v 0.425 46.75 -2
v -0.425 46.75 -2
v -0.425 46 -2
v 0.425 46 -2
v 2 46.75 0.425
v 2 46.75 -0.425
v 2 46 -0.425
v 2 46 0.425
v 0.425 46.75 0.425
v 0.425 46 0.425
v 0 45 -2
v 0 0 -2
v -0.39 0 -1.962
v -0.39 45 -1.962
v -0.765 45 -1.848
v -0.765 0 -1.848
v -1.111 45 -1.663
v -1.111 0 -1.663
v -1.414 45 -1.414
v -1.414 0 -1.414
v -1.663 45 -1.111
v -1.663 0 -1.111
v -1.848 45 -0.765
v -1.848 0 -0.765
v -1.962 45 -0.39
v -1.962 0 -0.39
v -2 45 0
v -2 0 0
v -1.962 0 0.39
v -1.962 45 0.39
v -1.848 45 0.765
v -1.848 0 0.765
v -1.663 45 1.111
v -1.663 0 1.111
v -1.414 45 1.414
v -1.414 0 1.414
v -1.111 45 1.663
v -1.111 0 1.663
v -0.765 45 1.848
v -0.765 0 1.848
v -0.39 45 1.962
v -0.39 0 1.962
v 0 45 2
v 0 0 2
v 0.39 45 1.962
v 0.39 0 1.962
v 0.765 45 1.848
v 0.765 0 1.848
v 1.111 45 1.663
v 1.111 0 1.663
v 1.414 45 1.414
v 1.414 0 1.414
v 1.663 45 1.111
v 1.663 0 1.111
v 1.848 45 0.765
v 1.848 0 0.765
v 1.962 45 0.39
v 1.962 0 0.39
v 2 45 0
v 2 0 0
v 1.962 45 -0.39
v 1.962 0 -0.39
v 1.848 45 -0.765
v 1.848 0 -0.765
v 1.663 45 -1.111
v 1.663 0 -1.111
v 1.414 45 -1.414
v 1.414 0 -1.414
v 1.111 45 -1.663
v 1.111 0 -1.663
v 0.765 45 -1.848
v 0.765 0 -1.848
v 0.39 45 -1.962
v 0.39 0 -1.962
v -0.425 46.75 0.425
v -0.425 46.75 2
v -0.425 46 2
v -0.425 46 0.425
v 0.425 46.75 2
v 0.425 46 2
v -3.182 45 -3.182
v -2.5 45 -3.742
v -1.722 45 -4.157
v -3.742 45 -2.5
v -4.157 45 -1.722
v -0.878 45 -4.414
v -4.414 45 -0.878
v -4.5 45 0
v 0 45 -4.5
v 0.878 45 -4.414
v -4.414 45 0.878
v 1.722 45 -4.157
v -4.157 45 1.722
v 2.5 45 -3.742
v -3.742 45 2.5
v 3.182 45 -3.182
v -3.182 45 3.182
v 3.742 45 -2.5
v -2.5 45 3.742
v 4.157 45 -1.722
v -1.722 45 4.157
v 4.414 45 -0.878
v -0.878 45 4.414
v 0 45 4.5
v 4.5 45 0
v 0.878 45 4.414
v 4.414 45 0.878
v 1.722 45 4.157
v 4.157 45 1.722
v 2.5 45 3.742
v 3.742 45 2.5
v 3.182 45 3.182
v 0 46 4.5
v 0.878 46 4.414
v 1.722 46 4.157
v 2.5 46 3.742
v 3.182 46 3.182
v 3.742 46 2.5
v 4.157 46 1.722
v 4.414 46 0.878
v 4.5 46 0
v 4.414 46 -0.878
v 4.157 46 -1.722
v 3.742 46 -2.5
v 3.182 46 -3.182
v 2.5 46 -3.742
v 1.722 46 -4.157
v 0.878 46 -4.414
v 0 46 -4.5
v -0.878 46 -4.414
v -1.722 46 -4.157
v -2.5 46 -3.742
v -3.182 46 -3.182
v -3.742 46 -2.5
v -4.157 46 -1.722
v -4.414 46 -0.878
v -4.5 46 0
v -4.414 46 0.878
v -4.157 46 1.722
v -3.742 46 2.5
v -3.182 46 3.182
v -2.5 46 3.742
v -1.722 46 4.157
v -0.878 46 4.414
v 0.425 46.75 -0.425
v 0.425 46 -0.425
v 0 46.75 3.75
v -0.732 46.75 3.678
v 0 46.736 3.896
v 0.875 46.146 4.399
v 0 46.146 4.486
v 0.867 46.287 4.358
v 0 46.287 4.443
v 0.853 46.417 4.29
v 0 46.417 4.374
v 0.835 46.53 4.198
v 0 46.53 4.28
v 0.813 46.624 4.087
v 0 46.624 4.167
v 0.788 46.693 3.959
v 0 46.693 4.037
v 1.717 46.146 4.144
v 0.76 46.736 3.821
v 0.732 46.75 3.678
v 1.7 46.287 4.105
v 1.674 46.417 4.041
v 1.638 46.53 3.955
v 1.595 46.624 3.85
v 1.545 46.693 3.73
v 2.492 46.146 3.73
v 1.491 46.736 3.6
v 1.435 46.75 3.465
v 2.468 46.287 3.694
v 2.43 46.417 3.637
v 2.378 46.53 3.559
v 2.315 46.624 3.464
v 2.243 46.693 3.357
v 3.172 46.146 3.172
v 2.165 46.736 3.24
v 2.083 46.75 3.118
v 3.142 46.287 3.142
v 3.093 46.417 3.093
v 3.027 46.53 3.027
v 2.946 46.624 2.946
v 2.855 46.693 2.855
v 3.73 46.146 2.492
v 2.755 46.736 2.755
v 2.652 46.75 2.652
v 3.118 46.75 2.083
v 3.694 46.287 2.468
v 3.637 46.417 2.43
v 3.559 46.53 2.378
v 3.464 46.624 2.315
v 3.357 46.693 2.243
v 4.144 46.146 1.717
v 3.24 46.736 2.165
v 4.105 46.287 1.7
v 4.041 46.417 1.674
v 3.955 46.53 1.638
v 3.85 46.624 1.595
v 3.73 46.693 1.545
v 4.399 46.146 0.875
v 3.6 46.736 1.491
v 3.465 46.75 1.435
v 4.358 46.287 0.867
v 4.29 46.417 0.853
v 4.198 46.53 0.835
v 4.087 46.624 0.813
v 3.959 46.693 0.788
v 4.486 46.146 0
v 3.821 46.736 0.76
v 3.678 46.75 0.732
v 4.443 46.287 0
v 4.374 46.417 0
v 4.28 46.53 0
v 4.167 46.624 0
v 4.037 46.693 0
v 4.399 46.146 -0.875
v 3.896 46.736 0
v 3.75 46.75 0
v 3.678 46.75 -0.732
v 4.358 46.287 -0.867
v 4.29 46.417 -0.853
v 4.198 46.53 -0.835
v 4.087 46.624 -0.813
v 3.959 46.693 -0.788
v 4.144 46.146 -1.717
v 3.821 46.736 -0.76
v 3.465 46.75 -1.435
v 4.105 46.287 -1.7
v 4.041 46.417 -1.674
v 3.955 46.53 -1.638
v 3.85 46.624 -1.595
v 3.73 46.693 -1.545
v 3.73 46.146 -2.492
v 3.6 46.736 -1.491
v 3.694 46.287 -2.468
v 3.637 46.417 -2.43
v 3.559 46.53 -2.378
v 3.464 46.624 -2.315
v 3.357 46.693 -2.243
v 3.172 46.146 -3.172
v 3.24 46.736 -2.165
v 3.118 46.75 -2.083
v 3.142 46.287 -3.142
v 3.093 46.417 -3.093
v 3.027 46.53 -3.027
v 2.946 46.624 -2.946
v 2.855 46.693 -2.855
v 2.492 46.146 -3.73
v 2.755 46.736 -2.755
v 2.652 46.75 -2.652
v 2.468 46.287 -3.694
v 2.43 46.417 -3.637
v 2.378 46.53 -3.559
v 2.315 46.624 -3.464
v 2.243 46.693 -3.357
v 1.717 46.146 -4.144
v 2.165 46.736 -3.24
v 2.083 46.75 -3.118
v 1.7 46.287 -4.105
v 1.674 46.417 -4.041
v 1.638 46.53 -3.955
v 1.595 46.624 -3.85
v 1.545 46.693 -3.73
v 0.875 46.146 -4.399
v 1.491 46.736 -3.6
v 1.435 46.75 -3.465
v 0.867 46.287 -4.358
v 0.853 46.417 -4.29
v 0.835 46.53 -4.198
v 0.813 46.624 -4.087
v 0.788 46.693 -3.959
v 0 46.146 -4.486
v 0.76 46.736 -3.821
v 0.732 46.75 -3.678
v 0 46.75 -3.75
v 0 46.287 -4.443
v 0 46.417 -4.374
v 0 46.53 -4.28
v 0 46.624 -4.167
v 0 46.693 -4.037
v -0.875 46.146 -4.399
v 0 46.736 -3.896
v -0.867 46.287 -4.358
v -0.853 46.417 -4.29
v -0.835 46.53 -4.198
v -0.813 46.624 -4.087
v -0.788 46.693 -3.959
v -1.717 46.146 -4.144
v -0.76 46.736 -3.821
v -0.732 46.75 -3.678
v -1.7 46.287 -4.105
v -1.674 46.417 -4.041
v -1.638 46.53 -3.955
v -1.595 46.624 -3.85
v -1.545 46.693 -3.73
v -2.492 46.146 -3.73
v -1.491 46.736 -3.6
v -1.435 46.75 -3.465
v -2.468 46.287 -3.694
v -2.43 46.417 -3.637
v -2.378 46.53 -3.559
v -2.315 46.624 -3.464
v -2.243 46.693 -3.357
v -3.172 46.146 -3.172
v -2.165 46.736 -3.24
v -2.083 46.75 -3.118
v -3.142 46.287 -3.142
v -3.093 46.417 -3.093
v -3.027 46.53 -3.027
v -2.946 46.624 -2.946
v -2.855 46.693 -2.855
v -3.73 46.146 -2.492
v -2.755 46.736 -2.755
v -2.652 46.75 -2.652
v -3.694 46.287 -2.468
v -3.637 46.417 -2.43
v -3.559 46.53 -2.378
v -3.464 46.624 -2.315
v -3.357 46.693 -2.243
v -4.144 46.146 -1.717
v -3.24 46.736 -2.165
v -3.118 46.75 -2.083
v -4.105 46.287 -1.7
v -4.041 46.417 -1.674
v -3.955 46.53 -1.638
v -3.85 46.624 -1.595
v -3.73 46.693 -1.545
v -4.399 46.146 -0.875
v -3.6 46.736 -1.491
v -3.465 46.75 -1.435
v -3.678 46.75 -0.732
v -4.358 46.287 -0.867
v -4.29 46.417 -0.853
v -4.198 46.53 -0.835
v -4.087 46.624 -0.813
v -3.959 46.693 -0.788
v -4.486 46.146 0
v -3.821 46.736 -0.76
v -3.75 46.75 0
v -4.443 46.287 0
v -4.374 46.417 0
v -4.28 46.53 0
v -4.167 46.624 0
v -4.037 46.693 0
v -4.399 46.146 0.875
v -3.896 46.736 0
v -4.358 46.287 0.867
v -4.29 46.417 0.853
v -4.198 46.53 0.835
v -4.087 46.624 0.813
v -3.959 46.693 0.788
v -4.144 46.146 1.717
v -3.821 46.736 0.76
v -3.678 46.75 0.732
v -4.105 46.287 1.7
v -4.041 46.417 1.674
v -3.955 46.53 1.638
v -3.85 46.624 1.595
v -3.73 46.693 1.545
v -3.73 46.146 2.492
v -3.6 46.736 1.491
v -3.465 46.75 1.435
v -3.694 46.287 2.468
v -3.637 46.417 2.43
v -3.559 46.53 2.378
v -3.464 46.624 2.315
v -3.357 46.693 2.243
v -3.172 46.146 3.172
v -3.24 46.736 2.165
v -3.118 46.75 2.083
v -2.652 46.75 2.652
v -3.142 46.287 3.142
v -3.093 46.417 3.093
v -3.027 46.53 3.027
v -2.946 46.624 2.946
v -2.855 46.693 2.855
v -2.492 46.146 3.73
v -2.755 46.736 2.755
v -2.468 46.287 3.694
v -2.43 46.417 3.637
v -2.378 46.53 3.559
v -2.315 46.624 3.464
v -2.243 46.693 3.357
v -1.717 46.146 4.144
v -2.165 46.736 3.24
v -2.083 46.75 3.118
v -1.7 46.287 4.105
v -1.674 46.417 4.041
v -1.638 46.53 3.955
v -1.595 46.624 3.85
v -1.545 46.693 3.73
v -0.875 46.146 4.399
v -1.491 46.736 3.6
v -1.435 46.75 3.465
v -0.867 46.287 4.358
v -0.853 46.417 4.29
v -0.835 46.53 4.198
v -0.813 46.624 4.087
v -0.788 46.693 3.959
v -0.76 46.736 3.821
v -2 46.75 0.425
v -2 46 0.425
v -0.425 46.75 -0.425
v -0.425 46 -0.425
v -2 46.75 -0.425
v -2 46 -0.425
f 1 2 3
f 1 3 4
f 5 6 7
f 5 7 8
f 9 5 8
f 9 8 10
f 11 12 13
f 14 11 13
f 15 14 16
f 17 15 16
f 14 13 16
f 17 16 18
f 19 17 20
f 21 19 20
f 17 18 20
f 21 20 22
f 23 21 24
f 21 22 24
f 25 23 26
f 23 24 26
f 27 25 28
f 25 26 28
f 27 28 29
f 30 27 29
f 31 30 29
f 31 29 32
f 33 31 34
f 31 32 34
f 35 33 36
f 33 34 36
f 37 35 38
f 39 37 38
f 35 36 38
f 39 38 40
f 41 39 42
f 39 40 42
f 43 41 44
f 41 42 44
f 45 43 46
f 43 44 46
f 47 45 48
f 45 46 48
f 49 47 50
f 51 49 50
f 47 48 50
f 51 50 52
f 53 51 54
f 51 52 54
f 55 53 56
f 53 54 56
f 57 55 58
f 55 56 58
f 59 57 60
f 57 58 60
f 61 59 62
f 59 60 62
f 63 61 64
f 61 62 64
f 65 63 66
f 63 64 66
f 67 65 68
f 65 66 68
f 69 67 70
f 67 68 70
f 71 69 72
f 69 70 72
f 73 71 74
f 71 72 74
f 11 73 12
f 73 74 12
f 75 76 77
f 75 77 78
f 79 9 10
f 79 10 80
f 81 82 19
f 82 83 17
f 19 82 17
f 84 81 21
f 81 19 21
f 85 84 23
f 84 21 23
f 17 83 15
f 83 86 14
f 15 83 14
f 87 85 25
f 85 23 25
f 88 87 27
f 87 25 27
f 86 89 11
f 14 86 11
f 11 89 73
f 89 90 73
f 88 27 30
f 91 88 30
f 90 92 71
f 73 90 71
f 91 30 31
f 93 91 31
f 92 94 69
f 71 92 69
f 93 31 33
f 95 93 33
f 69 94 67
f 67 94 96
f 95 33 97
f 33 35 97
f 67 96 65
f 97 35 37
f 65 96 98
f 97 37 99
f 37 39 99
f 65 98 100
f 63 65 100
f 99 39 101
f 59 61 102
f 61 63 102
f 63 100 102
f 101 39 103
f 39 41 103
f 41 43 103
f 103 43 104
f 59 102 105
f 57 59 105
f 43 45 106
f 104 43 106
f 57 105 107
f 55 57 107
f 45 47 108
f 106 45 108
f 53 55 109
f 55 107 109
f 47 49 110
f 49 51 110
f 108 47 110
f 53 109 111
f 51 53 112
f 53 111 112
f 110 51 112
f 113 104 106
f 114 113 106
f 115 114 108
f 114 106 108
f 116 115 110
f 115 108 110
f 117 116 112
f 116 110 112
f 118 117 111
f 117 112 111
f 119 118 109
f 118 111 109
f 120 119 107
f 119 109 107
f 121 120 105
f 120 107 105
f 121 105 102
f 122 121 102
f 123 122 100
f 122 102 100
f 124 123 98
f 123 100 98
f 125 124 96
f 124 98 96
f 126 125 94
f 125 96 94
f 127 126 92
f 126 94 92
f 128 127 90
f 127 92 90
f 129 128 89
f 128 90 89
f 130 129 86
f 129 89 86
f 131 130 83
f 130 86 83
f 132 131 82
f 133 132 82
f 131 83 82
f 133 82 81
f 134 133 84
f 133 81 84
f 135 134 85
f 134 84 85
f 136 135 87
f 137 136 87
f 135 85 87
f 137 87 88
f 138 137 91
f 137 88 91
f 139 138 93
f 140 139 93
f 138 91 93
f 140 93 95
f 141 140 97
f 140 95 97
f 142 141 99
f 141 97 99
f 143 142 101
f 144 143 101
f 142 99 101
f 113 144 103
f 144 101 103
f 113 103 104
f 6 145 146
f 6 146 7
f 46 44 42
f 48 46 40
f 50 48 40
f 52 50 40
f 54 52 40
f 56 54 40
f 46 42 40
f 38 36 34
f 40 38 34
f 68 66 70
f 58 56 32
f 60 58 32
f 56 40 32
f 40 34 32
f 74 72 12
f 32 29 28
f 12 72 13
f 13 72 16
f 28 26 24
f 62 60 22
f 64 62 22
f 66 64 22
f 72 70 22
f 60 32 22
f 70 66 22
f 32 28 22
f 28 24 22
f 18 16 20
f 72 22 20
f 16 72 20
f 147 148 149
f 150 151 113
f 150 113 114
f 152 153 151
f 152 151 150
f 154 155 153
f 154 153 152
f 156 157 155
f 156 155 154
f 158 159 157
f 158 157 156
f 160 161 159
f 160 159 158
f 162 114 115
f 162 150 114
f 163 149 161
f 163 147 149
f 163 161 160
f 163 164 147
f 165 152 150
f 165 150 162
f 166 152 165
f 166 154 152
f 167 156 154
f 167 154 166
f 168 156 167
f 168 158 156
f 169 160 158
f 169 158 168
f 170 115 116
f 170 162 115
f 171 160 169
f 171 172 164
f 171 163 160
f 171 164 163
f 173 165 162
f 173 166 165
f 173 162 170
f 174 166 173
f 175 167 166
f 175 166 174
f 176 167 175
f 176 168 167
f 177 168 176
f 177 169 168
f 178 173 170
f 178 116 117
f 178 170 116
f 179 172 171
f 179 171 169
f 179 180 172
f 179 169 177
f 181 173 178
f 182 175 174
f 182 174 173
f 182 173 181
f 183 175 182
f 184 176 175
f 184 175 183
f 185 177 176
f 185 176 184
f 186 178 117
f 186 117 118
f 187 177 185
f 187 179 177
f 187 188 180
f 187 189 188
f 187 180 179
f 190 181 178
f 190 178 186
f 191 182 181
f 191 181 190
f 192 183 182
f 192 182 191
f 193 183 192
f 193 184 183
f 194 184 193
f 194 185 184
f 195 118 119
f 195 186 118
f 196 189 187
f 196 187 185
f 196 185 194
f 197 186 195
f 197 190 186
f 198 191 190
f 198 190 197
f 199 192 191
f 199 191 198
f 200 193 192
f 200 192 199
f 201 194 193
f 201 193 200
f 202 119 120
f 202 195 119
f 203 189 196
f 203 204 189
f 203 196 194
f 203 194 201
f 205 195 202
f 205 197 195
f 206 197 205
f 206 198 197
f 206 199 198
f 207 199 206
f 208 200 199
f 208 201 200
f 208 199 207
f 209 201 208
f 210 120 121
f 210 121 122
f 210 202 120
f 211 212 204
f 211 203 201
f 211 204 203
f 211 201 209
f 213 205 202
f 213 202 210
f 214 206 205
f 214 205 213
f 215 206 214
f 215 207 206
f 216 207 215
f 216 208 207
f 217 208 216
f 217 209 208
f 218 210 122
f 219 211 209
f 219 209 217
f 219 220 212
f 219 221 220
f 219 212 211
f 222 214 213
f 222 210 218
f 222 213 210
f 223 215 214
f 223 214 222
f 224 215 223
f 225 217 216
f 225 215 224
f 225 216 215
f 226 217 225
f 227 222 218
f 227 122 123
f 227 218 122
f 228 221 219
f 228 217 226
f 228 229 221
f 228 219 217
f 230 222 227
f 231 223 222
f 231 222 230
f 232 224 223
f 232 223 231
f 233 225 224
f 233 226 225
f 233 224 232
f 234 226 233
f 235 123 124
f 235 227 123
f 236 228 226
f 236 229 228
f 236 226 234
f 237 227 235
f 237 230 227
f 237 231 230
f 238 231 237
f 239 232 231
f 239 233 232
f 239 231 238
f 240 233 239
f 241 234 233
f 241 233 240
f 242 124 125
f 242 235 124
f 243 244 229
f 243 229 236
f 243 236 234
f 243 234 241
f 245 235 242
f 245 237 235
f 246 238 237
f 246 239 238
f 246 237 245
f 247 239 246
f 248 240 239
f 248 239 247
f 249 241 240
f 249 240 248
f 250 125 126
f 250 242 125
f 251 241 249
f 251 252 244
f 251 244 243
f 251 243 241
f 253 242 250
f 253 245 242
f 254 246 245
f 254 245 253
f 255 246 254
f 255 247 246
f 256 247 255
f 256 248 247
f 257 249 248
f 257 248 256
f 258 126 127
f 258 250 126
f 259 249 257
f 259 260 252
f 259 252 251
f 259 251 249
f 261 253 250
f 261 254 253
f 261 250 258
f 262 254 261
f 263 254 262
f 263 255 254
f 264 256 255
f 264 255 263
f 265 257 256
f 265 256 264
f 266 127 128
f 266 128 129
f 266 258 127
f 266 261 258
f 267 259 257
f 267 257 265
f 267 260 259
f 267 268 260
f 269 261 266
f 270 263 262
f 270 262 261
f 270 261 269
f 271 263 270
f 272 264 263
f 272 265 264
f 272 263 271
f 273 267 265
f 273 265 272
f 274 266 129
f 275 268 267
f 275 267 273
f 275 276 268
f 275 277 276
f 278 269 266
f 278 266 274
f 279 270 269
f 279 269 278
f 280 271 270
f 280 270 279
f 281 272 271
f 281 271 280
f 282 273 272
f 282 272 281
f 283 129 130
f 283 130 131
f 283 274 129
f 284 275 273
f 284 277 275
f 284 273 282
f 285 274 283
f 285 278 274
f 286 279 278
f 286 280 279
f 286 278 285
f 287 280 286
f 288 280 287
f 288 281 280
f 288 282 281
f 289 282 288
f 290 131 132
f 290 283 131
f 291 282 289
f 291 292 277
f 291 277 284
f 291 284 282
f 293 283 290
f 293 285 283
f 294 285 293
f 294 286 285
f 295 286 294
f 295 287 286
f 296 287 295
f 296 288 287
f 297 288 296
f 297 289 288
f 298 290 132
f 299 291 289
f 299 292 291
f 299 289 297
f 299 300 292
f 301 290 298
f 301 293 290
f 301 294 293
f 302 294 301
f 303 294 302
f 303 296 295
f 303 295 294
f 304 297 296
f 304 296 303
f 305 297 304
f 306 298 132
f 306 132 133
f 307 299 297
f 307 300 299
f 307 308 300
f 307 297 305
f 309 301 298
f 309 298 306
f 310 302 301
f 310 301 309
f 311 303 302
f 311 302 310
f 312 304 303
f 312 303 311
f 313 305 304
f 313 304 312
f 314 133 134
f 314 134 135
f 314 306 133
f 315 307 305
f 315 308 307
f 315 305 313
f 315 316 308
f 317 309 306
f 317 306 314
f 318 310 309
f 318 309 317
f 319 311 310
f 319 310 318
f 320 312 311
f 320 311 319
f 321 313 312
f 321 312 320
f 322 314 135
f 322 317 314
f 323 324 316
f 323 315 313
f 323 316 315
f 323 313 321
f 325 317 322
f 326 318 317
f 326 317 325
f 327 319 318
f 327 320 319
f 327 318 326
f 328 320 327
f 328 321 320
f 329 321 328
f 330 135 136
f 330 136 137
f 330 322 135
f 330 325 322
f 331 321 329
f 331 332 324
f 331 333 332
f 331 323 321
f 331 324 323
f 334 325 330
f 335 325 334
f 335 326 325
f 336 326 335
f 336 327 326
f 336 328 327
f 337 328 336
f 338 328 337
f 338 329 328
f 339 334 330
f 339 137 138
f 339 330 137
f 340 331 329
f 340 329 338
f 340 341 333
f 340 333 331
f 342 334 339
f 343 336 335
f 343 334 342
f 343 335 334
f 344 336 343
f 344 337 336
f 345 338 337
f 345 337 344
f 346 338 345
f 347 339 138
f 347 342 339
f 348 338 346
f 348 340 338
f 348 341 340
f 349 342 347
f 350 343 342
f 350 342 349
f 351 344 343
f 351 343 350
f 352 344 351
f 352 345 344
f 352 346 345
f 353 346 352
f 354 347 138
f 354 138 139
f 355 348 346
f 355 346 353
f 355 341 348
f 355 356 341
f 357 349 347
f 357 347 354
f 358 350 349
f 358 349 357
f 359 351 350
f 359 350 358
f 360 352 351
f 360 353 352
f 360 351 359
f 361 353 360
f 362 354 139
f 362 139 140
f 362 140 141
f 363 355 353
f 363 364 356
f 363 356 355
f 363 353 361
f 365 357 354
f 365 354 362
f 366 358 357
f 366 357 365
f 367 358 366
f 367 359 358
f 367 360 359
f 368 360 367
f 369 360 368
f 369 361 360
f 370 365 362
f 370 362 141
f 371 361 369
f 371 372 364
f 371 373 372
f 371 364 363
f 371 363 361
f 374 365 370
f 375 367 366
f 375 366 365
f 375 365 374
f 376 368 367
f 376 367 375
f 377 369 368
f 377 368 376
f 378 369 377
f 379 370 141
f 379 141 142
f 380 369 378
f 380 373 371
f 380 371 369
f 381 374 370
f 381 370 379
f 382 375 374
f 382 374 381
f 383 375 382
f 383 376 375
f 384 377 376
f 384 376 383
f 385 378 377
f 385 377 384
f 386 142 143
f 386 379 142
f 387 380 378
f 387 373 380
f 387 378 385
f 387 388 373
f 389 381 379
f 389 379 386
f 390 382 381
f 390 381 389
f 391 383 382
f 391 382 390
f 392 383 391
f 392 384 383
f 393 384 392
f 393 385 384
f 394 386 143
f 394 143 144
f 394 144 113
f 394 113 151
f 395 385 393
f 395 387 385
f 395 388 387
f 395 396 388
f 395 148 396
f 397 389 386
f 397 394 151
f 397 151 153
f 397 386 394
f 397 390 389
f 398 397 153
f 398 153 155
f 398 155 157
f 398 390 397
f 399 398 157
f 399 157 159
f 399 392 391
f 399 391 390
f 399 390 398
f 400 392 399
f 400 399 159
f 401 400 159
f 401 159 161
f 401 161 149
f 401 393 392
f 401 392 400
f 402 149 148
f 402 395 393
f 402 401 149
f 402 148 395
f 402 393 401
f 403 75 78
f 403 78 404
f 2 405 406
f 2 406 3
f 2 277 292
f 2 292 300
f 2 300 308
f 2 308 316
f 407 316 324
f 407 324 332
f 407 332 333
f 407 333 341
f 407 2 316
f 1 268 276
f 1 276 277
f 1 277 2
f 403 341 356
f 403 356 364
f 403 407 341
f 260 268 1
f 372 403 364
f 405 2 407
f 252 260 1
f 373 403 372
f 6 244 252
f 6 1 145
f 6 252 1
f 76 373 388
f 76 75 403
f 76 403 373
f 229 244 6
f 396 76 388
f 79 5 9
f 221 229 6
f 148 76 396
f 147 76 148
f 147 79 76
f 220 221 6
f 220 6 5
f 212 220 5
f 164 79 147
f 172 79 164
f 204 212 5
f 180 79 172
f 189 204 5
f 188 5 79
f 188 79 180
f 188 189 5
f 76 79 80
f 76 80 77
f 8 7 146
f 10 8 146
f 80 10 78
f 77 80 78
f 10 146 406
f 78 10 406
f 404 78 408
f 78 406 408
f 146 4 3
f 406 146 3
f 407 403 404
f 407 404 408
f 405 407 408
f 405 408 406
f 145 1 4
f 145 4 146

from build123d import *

# Parameters (mm, degrees)
SKETCH3_R           = 2
BOSS_EXTRUDE1_DEPTH = 45
SKETCH4_R           = 4.5
BOSS_EXTRUDE2_DEPTH = 1.75
FILLET3_R           = 0.75
CUT_EXTRUDE4_DEPTH  = 0.75


with BuildPart() as part:
    # Sketch3 → Boss-Extrude1 (new body)
    with BuildSketch(Plane(origin=(0, 0, 0), x_dir=(1, 0, 0), z_dir=(0, 1, 0))):
        with Locations(Location((0, 0, 0), (0, 0, 90))):
            Circle(SKETCH3_R)
    extrude(amount=BOSS_EXTRUDE1_DEPTH)

    # Sketch4 → Boss-Extrude2 (add)
    with BuildSketch(Plane(origin=(0, 45, 0), x_dir=(1, 0, 0), z_dir=(0, 1, 0))):
        with Locations(Location((0, 0, 0), (0, 0, 270))):
            Circle(SKETCH4_R)
    extrude(amount=BOSS_EXTRUDE2_DEPTH)

    # Fillet3
    fillet3_edges = [part.edges().sort_by_distance(p)[0] for p in [
        (0, 46.75, -4.5),
    ]]
    fillet(fillet3_edges, radius=FILLET3_R)

    # Sketch6 → Cut-Extrude4 (cut)
    with BuildSketch(Plane(origin=(0, 46.75, 0), x_dir=(1, 0, 0), z_dir=(0, 1, 0))):
        Polygon((0.425, 0.425), (2, 0.425), (2, -0.425), (0.425, -0.425), (0.425, -2), (-0.425, -2), (-0.425, -0.425), (-2, -0.425), (-2, 0.425), (-0.425, 0.425), (-0.425, 2), (0.425, 2), align=None)
    extrude(amount=-CUT_EXTRUDE4_DEPTH, mode=Mode.SUBTRACT)


solid = part.part
